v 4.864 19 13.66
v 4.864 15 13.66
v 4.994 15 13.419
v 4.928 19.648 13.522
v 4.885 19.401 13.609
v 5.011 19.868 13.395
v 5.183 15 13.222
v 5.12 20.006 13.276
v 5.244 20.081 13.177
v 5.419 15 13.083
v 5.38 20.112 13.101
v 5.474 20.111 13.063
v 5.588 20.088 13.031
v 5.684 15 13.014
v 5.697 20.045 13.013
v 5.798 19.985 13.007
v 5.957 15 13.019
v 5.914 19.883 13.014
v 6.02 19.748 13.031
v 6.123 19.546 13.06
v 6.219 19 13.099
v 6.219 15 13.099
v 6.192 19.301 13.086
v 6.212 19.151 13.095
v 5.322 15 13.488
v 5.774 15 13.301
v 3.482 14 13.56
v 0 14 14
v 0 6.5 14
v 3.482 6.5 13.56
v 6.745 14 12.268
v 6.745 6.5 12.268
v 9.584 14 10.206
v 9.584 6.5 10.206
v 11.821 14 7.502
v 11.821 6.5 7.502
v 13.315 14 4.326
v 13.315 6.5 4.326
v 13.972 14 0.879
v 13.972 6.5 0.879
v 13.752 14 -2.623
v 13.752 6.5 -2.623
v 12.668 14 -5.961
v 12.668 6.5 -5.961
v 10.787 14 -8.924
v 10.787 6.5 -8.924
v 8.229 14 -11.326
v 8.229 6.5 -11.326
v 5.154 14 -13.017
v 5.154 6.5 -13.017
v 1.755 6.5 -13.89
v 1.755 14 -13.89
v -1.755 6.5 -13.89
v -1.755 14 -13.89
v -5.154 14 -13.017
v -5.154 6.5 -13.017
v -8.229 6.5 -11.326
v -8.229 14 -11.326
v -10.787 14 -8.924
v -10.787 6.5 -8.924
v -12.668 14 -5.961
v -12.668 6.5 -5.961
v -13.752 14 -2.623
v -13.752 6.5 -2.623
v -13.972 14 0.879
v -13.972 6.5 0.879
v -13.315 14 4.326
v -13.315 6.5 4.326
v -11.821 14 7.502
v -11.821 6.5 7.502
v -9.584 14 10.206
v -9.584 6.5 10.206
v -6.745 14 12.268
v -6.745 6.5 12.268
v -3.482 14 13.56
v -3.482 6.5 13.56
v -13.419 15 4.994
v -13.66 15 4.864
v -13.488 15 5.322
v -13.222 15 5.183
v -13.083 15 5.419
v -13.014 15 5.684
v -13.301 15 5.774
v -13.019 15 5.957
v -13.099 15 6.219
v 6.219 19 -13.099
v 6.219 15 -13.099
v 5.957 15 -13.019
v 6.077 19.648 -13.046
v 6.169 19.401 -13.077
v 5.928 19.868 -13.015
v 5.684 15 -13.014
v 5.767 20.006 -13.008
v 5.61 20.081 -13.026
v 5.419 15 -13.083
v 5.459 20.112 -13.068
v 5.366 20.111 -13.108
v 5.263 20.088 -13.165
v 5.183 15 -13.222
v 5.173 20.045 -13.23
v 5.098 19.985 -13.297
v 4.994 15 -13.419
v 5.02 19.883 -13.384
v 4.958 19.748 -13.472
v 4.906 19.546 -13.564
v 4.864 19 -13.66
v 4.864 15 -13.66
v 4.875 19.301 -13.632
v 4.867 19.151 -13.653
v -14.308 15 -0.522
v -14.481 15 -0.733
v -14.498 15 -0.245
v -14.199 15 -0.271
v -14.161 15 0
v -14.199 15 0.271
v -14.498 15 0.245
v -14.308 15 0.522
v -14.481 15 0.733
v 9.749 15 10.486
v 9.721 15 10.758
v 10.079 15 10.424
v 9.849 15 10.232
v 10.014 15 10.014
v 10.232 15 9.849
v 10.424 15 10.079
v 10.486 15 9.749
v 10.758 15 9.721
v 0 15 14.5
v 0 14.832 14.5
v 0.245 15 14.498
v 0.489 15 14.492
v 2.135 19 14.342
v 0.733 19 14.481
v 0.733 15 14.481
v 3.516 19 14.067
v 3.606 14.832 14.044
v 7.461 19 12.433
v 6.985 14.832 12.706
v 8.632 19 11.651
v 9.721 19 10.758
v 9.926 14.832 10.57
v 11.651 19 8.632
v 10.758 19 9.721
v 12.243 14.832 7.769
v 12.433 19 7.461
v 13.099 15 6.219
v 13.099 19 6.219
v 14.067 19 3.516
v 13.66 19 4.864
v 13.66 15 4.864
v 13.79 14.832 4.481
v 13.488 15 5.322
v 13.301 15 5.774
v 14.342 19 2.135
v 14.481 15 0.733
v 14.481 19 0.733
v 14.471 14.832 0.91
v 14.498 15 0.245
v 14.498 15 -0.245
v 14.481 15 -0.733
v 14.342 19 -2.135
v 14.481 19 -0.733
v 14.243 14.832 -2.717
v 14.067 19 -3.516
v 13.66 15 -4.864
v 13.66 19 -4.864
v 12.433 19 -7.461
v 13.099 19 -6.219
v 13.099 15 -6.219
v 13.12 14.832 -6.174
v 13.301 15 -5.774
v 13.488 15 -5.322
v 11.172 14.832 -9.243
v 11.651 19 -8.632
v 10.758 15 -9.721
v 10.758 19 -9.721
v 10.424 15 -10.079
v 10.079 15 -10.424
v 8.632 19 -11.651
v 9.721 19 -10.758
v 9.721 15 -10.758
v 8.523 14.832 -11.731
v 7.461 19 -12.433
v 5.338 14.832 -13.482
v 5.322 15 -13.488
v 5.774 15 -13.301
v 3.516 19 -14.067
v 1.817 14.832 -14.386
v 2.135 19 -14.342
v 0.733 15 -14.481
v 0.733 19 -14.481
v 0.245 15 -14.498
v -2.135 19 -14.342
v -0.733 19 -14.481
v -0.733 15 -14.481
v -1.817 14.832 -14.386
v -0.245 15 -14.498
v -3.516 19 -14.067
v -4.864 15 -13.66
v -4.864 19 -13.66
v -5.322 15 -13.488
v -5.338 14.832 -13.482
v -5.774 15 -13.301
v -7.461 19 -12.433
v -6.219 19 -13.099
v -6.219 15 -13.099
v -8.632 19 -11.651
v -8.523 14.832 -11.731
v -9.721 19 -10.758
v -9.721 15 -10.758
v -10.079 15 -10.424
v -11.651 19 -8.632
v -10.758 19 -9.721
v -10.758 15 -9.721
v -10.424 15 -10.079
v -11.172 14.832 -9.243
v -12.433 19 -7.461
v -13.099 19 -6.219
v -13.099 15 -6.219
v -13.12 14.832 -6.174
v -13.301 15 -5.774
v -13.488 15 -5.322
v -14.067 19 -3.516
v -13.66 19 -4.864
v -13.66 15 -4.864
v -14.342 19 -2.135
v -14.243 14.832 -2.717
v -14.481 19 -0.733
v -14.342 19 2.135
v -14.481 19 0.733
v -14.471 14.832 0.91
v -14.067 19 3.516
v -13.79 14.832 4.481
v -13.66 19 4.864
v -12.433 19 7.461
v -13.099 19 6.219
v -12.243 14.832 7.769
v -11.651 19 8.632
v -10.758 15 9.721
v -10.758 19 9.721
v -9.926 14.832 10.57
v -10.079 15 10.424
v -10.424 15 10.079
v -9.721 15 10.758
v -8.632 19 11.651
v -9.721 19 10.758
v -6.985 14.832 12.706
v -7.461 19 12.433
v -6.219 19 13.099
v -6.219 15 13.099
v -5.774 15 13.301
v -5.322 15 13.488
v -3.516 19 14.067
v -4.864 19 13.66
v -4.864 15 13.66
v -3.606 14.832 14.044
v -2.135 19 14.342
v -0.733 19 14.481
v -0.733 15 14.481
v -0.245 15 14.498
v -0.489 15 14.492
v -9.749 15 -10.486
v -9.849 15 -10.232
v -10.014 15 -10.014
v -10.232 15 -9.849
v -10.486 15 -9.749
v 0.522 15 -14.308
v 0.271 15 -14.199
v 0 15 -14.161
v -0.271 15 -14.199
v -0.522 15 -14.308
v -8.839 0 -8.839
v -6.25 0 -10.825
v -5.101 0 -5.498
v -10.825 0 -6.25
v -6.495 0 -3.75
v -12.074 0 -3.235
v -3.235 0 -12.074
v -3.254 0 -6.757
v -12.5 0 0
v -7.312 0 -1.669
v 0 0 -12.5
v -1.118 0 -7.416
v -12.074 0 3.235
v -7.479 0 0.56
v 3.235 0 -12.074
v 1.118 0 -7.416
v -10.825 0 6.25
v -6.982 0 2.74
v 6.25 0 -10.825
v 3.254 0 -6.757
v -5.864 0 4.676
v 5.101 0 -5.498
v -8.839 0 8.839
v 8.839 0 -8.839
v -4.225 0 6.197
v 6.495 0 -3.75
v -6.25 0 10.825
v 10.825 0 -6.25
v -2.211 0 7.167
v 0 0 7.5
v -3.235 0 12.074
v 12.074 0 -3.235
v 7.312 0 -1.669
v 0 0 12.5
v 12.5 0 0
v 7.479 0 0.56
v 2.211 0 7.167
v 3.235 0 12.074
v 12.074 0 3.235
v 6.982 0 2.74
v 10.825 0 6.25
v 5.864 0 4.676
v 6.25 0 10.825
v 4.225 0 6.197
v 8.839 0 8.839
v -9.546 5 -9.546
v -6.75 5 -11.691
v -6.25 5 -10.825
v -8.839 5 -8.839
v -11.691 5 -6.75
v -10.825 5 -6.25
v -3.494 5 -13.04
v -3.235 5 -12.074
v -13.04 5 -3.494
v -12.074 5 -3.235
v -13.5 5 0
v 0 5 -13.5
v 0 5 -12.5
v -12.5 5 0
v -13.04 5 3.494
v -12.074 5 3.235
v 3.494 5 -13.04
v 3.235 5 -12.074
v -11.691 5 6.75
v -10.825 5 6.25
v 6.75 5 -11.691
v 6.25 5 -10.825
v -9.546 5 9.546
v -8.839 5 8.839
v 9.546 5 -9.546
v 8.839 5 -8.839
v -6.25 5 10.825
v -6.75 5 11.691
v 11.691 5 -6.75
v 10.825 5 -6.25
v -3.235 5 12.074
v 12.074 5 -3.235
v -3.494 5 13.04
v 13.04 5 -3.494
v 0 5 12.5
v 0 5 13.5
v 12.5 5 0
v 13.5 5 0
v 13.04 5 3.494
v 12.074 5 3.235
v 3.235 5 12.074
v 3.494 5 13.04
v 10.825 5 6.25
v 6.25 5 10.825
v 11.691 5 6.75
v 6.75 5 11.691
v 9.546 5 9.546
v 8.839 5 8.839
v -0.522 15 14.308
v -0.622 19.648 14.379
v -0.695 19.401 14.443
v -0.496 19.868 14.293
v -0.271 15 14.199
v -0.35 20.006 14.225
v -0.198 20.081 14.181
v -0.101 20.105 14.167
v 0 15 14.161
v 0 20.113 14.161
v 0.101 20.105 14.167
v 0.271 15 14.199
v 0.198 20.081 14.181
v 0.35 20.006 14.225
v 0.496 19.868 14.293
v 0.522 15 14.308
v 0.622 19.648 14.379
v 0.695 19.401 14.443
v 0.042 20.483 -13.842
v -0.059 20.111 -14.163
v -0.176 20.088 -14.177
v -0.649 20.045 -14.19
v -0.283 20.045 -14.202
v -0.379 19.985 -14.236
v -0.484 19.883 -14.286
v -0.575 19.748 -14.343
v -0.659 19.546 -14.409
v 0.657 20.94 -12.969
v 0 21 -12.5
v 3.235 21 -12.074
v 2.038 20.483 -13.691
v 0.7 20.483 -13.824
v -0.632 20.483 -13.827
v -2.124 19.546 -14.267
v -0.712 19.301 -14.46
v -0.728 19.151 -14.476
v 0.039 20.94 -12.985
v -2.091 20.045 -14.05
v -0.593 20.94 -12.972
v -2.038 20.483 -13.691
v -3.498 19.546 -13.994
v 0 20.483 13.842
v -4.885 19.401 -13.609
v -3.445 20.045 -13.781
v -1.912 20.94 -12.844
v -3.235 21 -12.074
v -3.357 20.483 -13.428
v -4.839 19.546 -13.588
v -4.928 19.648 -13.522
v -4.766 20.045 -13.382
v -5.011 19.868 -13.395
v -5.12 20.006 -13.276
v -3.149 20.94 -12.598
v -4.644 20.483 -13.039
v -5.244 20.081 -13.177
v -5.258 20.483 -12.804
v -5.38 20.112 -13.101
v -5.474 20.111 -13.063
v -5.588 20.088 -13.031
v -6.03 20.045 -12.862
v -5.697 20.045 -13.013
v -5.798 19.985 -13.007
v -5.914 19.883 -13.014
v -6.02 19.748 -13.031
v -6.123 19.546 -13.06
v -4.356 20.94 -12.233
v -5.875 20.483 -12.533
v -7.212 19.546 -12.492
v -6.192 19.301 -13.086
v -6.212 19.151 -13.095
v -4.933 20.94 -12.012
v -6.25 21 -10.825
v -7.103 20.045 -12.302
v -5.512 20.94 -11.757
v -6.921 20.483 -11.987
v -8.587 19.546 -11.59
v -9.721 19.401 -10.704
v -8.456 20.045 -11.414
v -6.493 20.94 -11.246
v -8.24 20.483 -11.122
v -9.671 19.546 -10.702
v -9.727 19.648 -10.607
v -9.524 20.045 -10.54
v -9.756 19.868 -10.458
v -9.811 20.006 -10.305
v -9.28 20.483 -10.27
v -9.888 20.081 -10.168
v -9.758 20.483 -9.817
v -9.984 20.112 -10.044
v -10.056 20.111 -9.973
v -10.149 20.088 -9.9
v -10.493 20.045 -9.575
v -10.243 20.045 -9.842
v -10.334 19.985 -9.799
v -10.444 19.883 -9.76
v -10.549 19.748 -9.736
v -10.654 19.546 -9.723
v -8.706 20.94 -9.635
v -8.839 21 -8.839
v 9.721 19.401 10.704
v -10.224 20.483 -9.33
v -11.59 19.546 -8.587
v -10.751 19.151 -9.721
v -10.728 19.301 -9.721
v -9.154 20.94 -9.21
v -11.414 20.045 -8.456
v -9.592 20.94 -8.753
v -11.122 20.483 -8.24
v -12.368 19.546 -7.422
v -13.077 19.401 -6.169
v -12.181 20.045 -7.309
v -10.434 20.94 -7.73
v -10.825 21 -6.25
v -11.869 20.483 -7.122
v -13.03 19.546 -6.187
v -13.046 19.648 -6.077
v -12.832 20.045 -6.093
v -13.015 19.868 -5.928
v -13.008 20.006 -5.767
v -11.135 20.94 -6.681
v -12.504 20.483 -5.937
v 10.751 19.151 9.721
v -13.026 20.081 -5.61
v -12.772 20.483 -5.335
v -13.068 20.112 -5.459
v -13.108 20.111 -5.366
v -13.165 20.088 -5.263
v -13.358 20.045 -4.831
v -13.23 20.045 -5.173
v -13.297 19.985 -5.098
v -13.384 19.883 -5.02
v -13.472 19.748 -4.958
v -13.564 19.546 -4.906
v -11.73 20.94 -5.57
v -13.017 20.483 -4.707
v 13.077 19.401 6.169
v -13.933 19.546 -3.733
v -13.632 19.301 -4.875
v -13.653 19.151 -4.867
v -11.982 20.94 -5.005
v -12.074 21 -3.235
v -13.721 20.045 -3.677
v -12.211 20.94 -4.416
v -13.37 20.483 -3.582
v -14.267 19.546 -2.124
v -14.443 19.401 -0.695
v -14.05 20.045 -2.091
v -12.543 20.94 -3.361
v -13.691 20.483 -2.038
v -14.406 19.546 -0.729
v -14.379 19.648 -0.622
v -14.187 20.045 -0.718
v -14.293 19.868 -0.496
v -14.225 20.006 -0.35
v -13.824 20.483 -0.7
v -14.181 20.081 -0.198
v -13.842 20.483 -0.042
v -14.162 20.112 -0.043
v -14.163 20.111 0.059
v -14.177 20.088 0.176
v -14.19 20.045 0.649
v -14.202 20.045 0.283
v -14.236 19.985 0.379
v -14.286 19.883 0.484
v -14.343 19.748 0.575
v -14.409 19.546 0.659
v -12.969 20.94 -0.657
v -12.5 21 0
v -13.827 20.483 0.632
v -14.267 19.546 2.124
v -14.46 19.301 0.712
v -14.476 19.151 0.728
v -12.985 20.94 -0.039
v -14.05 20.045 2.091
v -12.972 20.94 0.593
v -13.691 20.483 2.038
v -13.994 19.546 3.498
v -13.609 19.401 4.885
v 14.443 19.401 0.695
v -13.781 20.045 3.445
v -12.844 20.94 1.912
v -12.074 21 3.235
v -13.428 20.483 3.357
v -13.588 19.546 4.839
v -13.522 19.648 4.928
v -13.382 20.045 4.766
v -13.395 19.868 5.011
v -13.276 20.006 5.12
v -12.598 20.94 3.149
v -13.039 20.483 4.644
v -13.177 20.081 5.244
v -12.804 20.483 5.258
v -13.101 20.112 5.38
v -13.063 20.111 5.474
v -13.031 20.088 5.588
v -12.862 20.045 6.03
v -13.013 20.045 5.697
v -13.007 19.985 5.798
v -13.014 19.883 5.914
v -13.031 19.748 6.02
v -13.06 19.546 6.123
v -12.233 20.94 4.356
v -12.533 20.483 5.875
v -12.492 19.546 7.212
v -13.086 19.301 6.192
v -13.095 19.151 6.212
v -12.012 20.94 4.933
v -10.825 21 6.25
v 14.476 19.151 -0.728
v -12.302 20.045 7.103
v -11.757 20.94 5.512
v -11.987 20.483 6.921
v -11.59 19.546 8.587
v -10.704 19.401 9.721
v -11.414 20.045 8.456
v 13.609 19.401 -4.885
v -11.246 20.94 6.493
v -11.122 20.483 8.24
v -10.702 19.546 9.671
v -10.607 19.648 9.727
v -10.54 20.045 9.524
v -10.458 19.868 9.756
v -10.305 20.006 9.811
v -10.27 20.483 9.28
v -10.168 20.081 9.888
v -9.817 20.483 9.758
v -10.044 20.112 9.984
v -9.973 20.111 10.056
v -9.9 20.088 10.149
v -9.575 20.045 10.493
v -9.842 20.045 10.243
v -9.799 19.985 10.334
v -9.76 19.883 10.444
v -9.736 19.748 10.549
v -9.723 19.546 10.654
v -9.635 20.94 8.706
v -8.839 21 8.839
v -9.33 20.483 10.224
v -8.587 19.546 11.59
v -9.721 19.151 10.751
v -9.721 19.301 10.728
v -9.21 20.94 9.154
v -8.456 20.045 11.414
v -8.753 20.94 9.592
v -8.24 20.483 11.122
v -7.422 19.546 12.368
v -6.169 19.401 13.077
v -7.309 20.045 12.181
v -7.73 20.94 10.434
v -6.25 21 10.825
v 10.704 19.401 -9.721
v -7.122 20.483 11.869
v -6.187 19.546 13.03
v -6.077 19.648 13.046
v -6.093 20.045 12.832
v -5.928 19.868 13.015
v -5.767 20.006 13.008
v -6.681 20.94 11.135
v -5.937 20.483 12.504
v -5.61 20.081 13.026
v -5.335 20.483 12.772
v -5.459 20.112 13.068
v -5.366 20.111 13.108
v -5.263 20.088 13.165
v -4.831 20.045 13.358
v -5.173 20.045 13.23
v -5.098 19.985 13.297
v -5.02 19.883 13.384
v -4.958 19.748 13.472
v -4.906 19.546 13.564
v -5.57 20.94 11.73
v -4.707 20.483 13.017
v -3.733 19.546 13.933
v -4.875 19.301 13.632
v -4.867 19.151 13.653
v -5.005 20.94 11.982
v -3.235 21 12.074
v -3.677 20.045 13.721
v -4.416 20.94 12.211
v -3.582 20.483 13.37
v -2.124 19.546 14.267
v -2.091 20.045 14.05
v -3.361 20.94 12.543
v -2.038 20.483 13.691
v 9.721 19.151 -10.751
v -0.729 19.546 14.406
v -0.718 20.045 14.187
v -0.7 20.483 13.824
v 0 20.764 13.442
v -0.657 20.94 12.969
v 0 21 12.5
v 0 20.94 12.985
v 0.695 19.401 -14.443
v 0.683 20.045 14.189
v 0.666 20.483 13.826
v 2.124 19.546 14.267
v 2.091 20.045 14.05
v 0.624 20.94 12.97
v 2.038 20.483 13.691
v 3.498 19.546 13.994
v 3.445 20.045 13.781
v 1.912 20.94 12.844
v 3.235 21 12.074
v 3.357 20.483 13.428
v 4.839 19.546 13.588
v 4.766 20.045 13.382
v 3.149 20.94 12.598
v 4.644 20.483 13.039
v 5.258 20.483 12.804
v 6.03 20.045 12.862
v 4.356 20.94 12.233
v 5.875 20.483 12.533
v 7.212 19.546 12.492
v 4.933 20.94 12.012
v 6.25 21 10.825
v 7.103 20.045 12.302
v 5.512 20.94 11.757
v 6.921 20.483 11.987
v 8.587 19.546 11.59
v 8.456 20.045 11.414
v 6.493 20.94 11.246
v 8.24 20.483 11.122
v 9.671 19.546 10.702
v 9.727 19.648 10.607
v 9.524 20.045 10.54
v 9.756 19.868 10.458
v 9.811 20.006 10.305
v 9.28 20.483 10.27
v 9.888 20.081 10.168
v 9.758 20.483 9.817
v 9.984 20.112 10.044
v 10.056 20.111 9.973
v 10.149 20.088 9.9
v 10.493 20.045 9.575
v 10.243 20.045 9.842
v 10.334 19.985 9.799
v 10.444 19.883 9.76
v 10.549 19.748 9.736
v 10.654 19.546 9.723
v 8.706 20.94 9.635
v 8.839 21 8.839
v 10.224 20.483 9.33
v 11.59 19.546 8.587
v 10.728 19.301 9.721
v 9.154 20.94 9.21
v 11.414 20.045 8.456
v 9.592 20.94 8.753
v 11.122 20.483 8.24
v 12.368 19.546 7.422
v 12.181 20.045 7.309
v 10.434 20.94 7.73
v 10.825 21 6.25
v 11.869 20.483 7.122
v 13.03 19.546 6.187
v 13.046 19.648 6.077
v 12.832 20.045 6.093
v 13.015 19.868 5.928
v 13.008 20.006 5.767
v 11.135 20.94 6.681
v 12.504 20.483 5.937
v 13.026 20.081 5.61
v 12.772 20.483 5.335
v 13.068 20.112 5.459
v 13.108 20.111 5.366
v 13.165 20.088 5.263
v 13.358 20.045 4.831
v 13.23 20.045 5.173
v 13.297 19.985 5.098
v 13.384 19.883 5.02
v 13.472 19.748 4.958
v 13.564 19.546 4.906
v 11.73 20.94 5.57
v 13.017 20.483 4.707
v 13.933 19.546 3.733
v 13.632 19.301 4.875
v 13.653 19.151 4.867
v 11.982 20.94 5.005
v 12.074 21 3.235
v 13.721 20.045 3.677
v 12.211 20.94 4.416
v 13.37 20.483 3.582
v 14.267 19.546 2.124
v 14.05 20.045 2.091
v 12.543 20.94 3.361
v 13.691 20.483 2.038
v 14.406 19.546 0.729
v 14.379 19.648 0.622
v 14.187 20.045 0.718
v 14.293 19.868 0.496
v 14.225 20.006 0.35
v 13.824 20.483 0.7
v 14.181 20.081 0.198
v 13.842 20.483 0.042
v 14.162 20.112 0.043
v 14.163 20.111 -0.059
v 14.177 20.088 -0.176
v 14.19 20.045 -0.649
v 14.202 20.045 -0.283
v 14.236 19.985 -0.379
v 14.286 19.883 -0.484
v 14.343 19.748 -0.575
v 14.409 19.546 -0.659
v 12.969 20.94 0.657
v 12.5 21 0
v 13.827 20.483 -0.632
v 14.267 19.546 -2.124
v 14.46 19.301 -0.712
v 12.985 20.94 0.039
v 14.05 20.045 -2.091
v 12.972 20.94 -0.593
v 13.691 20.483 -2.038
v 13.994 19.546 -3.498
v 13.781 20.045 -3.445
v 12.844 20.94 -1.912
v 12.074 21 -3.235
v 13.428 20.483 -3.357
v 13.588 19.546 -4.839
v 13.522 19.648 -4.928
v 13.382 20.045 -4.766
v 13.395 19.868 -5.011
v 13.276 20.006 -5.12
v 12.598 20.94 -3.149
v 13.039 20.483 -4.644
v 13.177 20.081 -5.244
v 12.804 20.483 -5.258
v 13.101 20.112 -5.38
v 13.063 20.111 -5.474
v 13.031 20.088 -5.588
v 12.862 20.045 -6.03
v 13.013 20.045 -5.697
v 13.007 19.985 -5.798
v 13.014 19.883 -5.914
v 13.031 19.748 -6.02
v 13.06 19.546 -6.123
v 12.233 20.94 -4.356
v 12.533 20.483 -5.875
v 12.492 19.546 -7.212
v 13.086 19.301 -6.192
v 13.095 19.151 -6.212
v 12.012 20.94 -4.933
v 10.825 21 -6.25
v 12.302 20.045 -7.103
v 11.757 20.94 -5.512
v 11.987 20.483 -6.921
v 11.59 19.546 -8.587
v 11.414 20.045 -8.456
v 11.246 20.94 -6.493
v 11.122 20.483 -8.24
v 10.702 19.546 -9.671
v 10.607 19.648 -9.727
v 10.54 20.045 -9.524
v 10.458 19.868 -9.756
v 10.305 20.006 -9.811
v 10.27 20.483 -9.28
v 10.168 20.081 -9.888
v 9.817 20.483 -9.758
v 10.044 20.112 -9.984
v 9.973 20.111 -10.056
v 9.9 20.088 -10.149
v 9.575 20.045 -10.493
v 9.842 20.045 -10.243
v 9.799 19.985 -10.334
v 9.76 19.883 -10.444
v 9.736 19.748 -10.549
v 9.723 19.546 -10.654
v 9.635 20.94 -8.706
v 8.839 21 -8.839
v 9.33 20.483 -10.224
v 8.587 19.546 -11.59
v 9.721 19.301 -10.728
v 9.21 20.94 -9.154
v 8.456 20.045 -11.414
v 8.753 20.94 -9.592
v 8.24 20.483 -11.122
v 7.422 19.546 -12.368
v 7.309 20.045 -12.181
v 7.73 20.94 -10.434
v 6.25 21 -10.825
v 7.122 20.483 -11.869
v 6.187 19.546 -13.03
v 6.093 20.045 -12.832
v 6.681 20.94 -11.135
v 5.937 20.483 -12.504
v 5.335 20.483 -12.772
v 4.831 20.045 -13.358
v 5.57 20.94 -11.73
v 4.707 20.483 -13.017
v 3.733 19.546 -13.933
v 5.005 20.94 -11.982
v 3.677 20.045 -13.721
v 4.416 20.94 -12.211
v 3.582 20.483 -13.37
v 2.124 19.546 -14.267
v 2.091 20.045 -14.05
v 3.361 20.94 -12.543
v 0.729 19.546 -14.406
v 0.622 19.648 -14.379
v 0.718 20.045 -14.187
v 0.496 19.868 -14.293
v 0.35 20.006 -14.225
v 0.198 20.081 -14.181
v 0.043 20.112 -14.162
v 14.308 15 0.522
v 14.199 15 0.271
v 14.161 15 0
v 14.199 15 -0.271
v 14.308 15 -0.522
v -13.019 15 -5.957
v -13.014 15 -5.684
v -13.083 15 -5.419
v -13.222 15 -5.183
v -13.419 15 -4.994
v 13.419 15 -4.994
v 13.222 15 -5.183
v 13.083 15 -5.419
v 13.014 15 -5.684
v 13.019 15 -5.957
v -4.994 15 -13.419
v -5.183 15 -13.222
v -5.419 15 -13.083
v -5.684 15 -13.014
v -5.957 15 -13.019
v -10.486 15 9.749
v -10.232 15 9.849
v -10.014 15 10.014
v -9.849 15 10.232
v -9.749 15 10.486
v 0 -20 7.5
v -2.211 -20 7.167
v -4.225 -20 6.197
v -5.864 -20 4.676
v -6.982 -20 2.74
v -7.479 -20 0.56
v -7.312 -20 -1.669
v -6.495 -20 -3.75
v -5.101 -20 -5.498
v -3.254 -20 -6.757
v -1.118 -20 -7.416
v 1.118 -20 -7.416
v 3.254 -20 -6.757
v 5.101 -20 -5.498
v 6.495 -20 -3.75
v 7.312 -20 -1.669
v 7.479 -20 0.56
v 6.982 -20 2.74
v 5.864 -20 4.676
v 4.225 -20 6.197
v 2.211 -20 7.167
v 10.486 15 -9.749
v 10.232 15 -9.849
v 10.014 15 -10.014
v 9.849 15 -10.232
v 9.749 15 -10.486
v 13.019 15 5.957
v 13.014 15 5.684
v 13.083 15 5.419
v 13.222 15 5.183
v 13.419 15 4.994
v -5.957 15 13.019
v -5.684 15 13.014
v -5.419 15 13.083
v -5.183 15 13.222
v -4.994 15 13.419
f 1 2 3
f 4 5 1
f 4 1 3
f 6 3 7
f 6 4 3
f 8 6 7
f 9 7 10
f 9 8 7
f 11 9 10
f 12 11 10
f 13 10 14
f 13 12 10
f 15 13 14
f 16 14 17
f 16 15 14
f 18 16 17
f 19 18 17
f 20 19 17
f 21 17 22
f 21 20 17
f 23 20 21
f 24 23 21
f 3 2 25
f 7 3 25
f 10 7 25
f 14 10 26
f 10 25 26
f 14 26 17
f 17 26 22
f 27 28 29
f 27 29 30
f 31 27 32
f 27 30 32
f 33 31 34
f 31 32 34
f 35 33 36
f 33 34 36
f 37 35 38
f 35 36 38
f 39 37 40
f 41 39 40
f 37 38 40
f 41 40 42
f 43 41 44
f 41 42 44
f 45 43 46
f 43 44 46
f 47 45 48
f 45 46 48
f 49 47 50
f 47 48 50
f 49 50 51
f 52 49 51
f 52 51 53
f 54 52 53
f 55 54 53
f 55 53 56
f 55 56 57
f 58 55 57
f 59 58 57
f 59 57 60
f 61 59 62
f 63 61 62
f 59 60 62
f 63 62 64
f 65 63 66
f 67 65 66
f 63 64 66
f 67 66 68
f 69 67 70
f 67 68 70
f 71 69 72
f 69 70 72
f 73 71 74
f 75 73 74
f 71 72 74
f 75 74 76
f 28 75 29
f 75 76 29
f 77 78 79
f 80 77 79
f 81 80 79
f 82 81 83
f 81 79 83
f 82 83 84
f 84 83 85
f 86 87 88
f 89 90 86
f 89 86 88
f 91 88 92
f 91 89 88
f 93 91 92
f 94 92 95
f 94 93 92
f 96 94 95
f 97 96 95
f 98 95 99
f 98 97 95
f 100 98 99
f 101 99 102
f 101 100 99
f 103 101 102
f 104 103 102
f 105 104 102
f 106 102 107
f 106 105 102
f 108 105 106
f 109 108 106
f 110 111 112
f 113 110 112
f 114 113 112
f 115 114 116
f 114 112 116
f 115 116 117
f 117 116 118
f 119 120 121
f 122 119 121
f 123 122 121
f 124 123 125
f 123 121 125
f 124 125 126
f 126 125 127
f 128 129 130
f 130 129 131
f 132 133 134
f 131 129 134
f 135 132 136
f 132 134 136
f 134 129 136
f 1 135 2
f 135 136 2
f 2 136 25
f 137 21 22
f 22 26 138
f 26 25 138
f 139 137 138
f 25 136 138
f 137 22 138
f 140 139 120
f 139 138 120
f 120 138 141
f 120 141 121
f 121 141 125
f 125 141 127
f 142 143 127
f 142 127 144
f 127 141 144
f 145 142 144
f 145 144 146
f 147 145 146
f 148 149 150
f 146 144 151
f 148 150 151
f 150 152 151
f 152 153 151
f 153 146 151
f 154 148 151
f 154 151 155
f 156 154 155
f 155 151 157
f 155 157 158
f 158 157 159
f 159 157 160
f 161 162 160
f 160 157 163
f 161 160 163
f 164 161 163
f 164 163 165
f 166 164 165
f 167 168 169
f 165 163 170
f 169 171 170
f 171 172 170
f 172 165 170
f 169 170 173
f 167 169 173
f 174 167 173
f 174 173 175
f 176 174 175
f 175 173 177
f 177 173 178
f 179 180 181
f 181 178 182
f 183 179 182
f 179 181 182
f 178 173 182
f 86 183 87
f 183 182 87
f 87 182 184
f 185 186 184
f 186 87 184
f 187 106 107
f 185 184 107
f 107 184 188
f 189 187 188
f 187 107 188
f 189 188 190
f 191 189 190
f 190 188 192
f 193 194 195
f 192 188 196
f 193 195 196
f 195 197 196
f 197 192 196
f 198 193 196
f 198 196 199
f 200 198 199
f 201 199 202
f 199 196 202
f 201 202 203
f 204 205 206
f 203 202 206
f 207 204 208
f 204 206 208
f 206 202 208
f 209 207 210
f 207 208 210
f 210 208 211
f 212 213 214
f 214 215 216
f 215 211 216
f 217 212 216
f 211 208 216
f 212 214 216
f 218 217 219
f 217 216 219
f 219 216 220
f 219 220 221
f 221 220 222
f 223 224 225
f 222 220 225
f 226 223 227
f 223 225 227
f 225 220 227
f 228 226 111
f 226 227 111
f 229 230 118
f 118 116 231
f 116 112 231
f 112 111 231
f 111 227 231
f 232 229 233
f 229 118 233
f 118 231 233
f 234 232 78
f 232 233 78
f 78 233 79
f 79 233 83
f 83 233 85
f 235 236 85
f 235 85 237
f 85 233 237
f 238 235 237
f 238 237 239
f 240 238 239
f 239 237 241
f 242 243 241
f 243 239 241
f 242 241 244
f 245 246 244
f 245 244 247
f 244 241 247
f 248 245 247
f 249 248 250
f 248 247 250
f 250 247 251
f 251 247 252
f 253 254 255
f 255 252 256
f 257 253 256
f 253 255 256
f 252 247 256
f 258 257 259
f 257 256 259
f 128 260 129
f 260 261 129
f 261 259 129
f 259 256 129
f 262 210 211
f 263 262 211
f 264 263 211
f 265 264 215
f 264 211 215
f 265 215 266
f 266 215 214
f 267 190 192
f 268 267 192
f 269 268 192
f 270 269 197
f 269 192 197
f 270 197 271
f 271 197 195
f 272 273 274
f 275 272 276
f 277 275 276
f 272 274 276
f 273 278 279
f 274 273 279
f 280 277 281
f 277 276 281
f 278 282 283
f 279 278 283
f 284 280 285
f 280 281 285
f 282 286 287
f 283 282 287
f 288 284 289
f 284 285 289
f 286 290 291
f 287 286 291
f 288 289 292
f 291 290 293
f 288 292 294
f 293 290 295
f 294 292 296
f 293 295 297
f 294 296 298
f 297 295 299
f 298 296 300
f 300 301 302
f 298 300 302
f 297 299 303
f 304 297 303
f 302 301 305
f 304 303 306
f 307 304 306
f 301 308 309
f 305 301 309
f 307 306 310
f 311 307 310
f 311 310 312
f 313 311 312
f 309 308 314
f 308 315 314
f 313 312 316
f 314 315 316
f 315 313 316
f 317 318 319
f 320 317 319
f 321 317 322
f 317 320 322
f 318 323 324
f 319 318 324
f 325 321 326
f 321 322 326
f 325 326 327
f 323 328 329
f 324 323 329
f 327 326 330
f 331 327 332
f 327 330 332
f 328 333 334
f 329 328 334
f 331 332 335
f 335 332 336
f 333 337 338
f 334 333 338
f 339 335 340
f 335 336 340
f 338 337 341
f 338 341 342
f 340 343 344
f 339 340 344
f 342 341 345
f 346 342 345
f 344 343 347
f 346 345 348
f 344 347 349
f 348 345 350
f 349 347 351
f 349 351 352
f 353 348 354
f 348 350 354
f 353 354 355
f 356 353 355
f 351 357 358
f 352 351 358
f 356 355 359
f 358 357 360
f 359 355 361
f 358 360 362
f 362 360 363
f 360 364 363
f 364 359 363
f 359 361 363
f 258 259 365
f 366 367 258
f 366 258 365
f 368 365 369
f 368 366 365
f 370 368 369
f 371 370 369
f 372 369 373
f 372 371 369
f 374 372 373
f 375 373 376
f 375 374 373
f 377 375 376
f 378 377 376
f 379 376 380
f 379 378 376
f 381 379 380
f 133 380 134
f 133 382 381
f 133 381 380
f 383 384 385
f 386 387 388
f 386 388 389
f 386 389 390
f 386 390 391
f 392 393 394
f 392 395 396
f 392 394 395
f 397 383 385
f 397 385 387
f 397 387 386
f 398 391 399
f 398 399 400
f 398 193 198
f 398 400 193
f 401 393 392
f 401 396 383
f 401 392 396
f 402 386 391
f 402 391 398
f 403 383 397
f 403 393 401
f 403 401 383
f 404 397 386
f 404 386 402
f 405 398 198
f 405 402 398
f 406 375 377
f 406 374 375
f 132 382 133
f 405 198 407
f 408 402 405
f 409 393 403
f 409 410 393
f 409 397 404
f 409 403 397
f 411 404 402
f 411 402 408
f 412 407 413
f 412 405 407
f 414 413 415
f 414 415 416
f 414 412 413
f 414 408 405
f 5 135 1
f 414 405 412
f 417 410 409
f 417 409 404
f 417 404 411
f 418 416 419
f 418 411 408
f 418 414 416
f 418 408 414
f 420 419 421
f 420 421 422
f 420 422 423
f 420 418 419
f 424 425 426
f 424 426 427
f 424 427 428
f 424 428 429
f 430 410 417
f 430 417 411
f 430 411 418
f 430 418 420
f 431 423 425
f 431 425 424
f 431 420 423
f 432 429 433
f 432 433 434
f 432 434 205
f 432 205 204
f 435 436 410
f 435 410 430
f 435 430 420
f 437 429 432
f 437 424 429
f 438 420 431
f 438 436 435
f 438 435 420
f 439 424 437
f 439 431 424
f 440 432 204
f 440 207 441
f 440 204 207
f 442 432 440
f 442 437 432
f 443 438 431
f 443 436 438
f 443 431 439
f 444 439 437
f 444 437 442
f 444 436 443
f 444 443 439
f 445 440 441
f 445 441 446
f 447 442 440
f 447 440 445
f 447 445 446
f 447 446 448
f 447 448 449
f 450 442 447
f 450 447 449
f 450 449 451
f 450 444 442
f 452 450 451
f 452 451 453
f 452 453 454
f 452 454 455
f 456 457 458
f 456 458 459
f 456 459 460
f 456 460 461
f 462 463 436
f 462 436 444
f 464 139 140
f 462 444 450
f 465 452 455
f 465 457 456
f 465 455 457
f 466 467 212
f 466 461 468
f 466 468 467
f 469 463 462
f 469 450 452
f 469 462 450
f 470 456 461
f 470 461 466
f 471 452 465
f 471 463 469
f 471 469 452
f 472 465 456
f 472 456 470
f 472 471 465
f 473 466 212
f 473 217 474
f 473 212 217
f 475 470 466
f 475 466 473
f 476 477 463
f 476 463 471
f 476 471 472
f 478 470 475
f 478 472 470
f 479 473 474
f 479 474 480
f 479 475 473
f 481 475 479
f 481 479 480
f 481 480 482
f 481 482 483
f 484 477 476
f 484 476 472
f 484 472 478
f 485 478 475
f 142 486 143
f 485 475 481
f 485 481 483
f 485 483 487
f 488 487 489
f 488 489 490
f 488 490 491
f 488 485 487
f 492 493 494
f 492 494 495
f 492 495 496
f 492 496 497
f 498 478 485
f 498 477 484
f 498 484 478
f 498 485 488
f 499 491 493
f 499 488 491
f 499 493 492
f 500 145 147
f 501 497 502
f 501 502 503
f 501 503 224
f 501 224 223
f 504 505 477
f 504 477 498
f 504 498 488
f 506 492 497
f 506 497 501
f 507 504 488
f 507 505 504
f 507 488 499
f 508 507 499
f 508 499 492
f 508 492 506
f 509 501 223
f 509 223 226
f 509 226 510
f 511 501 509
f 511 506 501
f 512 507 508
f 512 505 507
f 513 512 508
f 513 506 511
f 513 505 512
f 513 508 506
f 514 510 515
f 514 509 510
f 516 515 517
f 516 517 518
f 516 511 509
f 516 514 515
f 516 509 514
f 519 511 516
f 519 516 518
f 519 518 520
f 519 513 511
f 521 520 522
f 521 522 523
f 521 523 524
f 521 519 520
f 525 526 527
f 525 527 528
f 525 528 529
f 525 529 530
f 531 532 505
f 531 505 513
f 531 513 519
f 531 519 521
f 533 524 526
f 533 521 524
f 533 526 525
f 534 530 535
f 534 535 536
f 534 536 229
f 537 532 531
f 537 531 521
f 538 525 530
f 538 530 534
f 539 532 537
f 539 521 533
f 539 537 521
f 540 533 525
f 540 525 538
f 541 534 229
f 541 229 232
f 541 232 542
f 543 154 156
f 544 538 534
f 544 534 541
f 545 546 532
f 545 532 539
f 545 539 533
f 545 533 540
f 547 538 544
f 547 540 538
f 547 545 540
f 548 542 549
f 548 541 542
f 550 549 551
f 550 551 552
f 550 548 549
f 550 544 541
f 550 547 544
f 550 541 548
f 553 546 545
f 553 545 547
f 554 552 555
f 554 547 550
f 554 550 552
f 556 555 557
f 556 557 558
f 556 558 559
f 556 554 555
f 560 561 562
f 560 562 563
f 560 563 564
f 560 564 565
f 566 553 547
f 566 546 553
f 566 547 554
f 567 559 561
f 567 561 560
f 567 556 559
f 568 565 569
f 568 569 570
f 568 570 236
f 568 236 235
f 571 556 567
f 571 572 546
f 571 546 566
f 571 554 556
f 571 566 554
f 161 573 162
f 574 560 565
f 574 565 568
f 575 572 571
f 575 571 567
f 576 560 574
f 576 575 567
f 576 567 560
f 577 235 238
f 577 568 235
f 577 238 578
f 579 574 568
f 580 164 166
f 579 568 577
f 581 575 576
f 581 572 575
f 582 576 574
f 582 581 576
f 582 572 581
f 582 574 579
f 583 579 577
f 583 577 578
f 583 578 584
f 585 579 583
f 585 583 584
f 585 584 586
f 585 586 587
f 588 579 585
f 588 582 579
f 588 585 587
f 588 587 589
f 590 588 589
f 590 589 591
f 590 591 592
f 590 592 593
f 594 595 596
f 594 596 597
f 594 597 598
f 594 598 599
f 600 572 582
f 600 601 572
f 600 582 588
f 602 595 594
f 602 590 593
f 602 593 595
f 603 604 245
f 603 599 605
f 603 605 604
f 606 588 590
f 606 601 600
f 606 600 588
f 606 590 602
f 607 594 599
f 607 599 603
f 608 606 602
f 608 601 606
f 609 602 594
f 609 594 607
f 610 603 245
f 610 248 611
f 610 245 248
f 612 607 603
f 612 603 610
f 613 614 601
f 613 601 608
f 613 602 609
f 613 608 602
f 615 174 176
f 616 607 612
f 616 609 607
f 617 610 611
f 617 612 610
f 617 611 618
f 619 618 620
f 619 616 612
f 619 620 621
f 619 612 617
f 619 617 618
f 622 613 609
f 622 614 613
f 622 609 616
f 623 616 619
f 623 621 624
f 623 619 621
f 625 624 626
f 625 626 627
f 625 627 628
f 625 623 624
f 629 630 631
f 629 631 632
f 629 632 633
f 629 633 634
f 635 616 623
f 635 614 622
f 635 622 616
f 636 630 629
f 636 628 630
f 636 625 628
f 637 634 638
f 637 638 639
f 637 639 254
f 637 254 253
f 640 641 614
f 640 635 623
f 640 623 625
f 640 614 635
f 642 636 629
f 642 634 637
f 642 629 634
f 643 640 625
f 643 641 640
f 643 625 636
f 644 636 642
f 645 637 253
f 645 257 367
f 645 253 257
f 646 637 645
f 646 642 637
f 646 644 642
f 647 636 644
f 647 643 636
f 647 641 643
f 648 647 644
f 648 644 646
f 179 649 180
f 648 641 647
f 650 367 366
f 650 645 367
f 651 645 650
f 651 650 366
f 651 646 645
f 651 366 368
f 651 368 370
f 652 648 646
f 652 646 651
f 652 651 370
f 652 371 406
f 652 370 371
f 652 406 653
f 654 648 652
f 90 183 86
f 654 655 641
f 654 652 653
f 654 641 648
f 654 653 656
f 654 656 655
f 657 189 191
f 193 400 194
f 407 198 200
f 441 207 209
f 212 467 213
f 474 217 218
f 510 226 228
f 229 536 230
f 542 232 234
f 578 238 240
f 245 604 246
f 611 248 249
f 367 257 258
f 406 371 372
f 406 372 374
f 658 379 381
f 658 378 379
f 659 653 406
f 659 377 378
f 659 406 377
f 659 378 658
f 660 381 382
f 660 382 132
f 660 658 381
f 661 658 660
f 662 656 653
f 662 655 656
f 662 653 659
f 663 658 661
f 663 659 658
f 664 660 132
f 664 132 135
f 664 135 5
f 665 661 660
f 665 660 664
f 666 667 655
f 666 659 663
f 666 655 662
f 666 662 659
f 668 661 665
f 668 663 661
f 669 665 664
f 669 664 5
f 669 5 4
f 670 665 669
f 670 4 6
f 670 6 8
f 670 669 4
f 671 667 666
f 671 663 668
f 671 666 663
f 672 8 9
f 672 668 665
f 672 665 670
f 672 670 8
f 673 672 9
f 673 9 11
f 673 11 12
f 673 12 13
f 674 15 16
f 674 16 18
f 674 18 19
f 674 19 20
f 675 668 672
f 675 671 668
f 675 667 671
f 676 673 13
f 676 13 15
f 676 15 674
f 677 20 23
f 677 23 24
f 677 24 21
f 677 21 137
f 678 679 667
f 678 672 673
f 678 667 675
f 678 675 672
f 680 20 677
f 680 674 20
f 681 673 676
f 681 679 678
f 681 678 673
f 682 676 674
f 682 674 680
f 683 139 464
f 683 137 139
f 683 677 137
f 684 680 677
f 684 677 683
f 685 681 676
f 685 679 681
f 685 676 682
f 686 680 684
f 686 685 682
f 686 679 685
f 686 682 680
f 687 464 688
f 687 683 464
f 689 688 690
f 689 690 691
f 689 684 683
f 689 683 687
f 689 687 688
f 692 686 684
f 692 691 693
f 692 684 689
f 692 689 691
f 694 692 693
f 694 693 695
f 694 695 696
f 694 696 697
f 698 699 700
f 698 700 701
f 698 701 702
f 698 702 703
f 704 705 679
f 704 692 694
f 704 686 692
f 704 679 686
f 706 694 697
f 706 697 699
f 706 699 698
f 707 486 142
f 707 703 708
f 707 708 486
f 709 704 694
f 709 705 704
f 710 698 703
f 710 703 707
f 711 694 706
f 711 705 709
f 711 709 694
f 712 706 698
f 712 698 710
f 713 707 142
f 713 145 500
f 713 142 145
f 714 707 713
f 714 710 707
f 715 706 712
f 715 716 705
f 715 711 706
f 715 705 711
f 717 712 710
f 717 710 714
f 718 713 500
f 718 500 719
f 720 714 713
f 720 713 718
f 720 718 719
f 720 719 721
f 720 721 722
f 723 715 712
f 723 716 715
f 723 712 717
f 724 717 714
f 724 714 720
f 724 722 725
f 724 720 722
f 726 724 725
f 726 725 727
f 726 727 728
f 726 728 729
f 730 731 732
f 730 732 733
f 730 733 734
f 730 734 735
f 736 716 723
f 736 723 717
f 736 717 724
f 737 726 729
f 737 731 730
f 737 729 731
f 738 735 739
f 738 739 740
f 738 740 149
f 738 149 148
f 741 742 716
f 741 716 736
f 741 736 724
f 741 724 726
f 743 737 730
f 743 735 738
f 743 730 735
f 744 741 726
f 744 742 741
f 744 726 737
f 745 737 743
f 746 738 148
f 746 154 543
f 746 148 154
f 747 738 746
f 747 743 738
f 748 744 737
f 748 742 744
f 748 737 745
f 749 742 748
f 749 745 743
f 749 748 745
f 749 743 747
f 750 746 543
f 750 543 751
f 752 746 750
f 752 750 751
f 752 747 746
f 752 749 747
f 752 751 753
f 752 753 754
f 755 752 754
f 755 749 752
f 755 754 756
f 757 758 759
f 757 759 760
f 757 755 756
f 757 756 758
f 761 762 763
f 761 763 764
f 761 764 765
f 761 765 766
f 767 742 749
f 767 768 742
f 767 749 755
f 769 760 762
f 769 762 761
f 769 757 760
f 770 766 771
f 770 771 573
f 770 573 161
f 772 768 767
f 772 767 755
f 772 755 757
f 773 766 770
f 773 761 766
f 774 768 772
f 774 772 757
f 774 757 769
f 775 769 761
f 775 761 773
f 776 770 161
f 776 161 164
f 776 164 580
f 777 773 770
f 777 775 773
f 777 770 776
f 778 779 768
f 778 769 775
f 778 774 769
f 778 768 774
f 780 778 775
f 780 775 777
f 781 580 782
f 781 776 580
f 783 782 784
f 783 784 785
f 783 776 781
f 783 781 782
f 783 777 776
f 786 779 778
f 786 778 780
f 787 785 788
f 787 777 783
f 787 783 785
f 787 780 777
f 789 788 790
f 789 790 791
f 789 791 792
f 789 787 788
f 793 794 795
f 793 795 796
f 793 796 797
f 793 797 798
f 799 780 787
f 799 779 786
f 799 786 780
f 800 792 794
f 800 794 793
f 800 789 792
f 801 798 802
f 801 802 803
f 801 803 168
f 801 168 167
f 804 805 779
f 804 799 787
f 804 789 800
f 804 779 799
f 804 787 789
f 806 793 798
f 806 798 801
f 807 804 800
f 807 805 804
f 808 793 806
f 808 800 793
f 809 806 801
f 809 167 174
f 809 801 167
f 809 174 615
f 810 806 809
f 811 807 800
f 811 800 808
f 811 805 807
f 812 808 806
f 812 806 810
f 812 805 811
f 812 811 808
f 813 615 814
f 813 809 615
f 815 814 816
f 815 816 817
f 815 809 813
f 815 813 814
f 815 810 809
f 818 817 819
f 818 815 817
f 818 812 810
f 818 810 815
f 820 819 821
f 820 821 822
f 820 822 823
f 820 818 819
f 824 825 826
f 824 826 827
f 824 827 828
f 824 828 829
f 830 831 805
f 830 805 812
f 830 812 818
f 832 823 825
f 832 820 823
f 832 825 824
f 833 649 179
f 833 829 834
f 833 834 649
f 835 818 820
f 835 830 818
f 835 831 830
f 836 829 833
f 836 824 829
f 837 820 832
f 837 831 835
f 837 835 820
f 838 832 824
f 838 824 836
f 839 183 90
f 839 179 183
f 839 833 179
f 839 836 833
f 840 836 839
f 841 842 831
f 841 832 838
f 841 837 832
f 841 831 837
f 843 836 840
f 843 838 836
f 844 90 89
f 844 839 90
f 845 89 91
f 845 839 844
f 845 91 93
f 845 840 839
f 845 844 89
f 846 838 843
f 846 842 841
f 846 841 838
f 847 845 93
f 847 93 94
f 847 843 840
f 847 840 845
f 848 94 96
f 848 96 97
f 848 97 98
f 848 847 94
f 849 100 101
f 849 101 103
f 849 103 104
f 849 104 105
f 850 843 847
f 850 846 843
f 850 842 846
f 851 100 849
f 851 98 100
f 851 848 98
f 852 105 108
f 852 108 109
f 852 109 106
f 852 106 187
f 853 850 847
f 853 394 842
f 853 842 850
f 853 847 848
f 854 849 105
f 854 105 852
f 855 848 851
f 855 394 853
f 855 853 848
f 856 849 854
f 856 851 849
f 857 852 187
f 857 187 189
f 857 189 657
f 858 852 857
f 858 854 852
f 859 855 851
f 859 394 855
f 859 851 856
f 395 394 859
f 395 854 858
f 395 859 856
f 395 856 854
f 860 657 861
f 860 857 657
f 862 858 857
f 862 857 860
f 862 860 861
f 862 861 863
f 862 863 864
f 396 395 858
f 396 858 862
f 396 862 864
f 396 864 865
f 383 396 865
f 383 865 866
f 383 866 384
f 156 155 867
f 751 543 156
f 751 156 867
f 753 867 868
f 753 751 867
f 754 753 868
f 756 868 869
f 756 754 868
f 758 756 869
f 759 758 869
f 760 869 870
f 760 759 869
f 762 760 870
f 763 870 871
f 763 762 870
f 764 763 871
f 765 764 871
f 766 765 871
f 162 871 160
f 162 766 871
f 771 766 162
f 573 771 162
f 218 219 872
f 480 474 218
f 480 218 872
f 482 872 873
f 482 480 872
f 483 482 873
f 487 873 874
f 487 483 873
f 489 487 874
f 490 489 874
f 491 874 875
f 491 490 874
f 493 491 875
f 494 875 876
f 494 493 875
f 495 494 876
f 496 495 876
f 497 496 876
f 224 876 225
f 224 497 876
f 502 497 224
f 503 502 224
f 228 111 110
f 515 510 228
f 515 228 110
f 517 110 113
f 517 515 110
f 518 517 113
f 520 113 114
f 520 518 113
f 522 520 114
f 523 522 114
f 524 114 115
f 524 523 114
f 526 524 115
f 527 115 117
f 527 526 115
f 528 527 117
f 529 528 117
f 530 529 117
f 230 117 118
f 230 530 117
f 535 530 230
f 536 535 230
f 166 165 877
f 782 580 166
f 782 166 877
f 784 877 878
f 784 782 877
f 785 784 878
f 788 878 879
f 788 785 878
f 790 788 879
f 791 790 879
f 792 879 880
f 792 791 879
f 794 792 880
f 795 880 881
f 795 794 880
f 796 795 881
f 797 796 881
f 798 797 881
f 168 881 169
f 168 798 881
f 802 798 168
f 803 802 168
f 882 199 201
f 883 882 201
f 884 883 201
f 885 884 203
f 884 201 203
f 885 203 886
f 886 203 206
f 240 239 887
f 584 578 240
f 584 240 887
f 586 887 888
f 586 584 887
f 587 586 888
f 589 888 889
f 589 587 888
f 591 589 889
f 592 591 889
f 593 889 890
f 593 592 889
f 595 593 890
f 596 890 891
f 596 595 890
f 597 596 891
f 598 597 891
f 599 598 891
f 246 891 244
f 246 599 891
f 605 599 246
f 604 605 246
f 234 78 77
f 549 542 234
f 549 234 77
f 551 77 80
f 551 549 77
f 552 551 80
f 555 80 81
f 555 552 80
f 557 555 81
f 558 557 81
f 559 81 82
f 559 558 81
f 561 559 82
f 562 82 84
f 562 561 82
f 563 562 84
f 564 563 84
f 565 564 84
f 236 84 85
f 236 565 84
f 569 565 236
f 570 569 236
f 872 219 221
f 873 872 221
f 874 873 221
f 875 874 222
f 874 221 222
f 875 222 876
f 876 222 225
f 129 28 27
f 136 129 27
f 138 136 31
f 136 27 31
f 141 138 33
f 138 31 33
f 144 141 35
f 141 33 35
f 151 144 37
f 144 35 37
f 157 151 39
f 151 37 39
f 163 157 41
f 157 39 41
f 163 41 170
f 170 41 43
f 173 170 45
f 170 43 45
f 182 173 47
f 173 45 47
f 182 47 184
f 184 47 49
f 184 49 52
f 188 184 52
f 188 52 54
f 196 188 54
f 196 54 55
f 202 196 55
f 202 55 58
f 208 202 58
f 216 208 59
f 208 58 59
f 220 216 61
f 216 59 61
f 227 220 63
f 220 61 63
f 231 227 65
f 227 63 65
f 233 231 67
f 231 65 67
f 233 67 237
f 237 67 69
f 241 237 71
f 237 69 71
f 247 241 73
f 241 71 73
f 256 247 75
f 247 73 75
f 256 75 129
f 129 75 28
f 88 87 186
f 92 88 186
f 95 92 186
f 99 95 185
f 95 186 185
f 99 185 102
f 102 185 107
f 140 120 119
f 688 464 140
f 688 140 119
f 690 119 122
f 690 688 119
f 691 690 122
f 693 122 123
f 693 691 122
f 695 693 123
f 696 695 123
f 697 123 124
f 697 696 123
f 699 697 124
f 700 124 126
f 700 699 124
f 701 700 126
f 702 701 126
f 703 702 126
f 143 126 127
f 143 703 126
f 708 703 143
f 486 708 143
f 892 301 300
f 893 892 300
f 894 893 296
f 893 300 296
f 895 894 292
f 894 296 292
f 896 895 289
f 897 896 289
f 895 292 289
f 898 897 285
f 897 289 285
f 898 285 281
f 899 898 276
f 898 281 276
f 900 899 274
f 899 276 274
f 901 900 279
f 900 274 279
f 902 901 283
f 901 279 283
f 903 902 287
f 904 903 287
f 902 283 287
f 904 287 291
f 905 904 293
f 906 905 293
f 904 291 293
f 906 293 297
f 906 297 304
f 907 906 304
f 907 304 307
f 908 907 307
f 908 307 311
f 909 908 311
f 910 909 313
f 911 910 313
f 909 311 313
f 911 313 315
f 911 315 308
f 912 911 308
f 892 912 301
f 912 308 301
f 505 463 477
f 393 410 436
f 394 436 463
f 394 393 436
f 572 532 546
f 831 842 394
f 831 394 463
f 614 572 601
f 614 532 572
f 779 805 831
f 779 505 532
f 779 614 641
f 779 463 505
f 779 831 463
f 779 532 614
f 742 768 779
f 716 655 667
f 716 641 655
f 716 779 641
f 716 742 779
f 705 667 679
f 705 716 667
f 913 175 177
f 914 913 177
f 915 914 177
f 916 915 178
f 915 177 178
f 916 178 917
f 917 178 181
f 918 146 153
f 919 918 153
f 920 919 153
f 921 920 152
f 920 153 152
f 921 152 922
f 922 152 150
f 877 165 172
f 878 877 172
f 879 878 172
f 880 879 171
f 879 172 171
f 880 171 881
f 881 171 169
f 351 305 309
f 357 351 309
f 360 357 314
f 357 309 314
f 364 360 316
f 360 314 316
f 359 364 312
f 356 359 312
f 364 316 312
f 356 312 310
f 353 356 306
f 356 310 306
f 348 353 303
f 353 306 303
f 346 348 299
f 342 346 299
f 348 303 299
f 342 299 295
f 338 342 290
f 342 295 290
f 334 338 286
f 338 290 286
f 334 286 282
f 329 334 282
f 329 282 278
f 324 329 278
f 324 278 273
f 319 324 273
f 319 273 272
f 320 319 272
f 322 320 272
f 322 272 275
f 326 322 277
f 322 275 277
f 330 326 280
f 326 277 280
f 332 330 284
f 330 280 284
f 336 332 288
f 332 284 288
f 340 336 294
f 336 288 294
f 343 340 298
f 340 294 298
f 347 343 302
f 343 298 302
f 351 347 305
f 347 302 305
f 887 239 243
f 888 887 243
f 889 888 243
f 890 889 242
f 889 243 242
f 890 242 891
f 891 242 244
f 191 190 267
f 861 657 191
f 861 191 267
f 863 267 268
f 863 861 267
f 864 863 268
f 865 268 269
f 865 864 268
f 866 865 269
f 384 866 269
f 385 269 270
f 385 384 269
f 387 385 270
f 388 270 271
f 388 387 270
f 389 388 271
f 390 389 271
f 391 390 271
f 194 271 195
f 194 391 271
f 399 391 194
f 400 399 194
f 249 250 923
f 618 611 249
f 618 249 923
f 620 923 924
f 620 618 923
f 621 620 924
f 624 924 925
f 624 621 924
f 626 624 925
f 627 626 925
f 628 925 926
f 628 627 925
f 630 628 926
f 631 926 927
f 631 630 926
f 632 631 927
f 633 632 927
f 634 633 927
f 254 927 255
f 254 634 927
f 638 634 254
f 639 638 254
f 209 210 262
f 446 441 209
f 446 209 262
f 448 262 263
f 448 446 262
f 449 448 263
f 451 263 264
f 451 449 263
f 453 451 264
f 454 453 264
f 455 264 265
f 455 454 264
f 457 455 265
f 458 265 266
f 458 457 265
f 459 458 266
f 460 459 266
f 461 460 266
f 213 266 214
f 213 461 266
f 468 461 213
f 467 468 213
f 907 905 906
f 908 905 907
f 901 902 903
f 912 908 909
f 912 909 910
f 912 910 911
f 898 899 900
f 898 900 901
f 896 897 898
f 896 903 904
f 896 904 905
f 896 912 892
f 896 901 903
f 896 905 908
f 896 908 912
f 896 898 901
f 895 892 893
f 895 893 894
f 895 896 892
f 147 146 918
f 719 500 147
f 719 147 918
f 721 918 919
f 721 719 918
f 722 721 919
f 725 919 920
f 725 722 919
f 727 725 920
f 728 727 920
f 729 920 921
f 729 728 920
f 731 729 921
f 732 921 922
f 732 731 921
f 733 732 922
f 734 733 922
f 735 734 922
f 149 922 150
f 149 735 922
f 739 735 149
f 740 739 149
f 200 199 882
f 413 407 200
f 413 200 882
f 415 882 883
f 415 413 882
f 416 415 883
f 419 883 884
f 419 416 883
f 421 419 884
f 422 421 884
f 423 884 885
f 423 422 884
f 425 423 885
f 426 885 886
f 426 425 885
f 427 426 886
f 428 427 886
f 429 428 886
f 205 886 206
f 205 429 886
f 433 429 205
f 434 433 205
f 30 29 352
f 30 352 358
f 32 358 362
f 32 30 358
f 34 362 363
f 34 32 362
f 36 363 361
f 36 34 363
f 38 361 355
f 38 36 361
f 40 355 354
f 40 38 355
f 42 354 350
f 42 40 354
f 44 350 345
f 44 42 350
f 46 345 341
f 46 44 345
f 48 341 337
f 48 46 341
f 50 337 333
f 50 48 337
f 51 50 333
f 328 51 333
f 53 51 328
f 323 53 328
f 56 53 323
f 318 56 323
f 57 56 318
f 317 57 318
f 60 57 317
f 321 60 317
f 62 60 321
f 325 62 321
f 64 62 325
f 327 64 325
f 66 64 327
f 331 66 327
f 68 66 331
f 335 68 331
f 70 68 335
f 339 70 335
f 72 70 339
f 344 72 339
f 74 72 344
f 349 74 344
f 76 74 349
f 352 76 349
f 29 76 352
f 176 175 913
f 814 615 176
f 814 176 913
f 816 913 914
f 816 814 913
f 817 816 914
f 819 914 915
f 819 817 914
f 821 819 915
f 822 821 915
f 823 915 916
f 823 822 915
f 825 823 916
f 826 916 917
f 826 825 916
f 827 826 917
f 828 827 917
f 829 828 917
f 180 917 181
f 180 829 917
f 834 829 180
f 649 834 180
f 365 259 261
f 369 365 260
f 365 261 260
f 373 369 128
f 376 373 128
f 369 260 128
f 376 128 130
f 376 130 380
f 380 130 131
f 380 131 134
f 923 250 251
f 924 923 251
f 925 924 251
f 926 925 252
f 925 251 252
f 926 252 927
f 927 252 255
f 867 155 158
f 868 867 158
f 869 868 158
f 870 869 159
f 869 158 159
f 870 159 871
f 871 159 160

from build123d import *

# Parameters (mm, degrees)
SKETCH1_R           = 12.5
BOSS_EXTRUDE1_DEPTH = 5
SKETCH2_R           = 7.5
BOSS_EXTRUDE2_DEPTH = 20
SKETCH3_R           = 14
BOSS_EXTRUDE3_DEPTH = 9
CHAMFER1_SIZE       = 0.5
CHAMFER1_SIZE2      = 1.5
SKETCH4_R           = 14.5
BOSS_EXTRUDE4_DEPTH = 7
FILLET3_R           = 2
CHAMFER2_SIZE2      = 0.5
CHAMFER2_SIZE       = 0.832139741
CUT_EXTRUDE2_DEPTH  = 6
CIRPATTERN1_COUNT   = 16


with BuildPart() as part:
    # Sketch1 → Boss-Extrude1 (new body)
    with BuildSketch(Plane(origin=(0, 0, 0), x_dir=(1, 0, 0), z_dir=(0, 1, 0))):
        with Locations(Location((0, 0, 0), (0, 0, 270))):
            Circle(SKETCH1_R)
    extrude(amount=BOSS_EXTRUDE1_DEPTH)

    # Sketch2 → Boss-Extrude2 (add)
    with BuildSketch(Plane.XZ):
        with Locations(Location((0, 0, 0), (0, 0, 90))):
            Circle(SKETCH2_R)
    extrude(amount=BOSS_EXTRUDE2_DEPTH)

    # Sketch3 → Boss-Extrude3 (add)
    with BuildSketch(Plane(origin=(0, 5, 0), x_dir=(1, 0, 0), z_dir=(0, 1, 0))):
        with Locations(Location((0, 0, 0), (0, 0, 270))):
            Circle(SKETCH3_R)
    extrude(amount=BOSS_EXTRUDE3_DEPTH)

    # Chamfer1
    chamfer1_edges = [part.edges().sort_by_distance(p)[0] for p in [
        (0, 5, -14),
    ]]
    chamfer1_side = [part.faces().sort_by_distance(p)[0] for p in [
        (0, 5, -13.604020203),
    ]]
    chamfer(chamfer1_edges, length=CHAMFER1_SIZE, length2=CHAMFER1_SIZE2, reference=chamfer1_side[0])

    # Sketch4 → Boss-Extrude4 (add)
    with BuildSketch(Plane(origin=(0, 14, 0), x_dir=(1, 0, 0), z_dir=(0, 1, 0))):
        with Locations(Location((0, 0, 0), (0, 0, 270))):
            Circle(SKETCH4_R)
    extrude(amount=BOSS_EXTRUDE4_DEPTH)

    # Fillet3
    fillet3_edges = [part.edges().sort_by_distance(p)[0] for p in [
        (0, 21, -14.5),
    ]]
    fillet(fillet3_edges, radius=FILLET3_R)

    # Chamfer2
    chamfer2_edges = [part.edges().sort_by_distance(p)[0] for p in [
        (0, 14, -14.5),
    ]]
    chamfer2_side = [part.faces().sort_by_distance(p)[0] for p in [
        (0, 14.01, -14.5),
    ]]
    chamfer(chamfer2_edges, length=CHAMFER2_SIZE - 0.0001, length2=CHAMFER2_SIZE2 - 0.0001, reference=chamfer2_side[0])  # a hair under: the kernel refuses the full size

    # Sketch5 → Cut-Extrude2 (cut)
    with BuildSketch(Plane(origin=(0, 21, 0), x_dir=(1, 0, 0), z_dir=(0, 1, 0))):
        with BuildLine():
            Line((-0.75, 14.5), (0.75, 14.5))
            ThreePointArc((0.75, 14.5), (0, 14.161437828), (-0.75, 14.5))
        make_face()
    cut_extrude2 = extrude(amount=-CUT_EXTRUDE2_DEPTH, mode=Mode.SUBTRACT)

    # CirPattern1: Cut-Extrude2 ×16 about axis
    cirpattern1_axis = Axis((0, 0, 0), (0, 1, 0))
    for i in range(1, CIRPATTERN1_COUNT):
        add(cut_extrude2.rotate(cirpattern1_axis, i * 360 / CIRPATTERN1_COUNT), mode=Mode.SUBTRACT)


solid = part.part
